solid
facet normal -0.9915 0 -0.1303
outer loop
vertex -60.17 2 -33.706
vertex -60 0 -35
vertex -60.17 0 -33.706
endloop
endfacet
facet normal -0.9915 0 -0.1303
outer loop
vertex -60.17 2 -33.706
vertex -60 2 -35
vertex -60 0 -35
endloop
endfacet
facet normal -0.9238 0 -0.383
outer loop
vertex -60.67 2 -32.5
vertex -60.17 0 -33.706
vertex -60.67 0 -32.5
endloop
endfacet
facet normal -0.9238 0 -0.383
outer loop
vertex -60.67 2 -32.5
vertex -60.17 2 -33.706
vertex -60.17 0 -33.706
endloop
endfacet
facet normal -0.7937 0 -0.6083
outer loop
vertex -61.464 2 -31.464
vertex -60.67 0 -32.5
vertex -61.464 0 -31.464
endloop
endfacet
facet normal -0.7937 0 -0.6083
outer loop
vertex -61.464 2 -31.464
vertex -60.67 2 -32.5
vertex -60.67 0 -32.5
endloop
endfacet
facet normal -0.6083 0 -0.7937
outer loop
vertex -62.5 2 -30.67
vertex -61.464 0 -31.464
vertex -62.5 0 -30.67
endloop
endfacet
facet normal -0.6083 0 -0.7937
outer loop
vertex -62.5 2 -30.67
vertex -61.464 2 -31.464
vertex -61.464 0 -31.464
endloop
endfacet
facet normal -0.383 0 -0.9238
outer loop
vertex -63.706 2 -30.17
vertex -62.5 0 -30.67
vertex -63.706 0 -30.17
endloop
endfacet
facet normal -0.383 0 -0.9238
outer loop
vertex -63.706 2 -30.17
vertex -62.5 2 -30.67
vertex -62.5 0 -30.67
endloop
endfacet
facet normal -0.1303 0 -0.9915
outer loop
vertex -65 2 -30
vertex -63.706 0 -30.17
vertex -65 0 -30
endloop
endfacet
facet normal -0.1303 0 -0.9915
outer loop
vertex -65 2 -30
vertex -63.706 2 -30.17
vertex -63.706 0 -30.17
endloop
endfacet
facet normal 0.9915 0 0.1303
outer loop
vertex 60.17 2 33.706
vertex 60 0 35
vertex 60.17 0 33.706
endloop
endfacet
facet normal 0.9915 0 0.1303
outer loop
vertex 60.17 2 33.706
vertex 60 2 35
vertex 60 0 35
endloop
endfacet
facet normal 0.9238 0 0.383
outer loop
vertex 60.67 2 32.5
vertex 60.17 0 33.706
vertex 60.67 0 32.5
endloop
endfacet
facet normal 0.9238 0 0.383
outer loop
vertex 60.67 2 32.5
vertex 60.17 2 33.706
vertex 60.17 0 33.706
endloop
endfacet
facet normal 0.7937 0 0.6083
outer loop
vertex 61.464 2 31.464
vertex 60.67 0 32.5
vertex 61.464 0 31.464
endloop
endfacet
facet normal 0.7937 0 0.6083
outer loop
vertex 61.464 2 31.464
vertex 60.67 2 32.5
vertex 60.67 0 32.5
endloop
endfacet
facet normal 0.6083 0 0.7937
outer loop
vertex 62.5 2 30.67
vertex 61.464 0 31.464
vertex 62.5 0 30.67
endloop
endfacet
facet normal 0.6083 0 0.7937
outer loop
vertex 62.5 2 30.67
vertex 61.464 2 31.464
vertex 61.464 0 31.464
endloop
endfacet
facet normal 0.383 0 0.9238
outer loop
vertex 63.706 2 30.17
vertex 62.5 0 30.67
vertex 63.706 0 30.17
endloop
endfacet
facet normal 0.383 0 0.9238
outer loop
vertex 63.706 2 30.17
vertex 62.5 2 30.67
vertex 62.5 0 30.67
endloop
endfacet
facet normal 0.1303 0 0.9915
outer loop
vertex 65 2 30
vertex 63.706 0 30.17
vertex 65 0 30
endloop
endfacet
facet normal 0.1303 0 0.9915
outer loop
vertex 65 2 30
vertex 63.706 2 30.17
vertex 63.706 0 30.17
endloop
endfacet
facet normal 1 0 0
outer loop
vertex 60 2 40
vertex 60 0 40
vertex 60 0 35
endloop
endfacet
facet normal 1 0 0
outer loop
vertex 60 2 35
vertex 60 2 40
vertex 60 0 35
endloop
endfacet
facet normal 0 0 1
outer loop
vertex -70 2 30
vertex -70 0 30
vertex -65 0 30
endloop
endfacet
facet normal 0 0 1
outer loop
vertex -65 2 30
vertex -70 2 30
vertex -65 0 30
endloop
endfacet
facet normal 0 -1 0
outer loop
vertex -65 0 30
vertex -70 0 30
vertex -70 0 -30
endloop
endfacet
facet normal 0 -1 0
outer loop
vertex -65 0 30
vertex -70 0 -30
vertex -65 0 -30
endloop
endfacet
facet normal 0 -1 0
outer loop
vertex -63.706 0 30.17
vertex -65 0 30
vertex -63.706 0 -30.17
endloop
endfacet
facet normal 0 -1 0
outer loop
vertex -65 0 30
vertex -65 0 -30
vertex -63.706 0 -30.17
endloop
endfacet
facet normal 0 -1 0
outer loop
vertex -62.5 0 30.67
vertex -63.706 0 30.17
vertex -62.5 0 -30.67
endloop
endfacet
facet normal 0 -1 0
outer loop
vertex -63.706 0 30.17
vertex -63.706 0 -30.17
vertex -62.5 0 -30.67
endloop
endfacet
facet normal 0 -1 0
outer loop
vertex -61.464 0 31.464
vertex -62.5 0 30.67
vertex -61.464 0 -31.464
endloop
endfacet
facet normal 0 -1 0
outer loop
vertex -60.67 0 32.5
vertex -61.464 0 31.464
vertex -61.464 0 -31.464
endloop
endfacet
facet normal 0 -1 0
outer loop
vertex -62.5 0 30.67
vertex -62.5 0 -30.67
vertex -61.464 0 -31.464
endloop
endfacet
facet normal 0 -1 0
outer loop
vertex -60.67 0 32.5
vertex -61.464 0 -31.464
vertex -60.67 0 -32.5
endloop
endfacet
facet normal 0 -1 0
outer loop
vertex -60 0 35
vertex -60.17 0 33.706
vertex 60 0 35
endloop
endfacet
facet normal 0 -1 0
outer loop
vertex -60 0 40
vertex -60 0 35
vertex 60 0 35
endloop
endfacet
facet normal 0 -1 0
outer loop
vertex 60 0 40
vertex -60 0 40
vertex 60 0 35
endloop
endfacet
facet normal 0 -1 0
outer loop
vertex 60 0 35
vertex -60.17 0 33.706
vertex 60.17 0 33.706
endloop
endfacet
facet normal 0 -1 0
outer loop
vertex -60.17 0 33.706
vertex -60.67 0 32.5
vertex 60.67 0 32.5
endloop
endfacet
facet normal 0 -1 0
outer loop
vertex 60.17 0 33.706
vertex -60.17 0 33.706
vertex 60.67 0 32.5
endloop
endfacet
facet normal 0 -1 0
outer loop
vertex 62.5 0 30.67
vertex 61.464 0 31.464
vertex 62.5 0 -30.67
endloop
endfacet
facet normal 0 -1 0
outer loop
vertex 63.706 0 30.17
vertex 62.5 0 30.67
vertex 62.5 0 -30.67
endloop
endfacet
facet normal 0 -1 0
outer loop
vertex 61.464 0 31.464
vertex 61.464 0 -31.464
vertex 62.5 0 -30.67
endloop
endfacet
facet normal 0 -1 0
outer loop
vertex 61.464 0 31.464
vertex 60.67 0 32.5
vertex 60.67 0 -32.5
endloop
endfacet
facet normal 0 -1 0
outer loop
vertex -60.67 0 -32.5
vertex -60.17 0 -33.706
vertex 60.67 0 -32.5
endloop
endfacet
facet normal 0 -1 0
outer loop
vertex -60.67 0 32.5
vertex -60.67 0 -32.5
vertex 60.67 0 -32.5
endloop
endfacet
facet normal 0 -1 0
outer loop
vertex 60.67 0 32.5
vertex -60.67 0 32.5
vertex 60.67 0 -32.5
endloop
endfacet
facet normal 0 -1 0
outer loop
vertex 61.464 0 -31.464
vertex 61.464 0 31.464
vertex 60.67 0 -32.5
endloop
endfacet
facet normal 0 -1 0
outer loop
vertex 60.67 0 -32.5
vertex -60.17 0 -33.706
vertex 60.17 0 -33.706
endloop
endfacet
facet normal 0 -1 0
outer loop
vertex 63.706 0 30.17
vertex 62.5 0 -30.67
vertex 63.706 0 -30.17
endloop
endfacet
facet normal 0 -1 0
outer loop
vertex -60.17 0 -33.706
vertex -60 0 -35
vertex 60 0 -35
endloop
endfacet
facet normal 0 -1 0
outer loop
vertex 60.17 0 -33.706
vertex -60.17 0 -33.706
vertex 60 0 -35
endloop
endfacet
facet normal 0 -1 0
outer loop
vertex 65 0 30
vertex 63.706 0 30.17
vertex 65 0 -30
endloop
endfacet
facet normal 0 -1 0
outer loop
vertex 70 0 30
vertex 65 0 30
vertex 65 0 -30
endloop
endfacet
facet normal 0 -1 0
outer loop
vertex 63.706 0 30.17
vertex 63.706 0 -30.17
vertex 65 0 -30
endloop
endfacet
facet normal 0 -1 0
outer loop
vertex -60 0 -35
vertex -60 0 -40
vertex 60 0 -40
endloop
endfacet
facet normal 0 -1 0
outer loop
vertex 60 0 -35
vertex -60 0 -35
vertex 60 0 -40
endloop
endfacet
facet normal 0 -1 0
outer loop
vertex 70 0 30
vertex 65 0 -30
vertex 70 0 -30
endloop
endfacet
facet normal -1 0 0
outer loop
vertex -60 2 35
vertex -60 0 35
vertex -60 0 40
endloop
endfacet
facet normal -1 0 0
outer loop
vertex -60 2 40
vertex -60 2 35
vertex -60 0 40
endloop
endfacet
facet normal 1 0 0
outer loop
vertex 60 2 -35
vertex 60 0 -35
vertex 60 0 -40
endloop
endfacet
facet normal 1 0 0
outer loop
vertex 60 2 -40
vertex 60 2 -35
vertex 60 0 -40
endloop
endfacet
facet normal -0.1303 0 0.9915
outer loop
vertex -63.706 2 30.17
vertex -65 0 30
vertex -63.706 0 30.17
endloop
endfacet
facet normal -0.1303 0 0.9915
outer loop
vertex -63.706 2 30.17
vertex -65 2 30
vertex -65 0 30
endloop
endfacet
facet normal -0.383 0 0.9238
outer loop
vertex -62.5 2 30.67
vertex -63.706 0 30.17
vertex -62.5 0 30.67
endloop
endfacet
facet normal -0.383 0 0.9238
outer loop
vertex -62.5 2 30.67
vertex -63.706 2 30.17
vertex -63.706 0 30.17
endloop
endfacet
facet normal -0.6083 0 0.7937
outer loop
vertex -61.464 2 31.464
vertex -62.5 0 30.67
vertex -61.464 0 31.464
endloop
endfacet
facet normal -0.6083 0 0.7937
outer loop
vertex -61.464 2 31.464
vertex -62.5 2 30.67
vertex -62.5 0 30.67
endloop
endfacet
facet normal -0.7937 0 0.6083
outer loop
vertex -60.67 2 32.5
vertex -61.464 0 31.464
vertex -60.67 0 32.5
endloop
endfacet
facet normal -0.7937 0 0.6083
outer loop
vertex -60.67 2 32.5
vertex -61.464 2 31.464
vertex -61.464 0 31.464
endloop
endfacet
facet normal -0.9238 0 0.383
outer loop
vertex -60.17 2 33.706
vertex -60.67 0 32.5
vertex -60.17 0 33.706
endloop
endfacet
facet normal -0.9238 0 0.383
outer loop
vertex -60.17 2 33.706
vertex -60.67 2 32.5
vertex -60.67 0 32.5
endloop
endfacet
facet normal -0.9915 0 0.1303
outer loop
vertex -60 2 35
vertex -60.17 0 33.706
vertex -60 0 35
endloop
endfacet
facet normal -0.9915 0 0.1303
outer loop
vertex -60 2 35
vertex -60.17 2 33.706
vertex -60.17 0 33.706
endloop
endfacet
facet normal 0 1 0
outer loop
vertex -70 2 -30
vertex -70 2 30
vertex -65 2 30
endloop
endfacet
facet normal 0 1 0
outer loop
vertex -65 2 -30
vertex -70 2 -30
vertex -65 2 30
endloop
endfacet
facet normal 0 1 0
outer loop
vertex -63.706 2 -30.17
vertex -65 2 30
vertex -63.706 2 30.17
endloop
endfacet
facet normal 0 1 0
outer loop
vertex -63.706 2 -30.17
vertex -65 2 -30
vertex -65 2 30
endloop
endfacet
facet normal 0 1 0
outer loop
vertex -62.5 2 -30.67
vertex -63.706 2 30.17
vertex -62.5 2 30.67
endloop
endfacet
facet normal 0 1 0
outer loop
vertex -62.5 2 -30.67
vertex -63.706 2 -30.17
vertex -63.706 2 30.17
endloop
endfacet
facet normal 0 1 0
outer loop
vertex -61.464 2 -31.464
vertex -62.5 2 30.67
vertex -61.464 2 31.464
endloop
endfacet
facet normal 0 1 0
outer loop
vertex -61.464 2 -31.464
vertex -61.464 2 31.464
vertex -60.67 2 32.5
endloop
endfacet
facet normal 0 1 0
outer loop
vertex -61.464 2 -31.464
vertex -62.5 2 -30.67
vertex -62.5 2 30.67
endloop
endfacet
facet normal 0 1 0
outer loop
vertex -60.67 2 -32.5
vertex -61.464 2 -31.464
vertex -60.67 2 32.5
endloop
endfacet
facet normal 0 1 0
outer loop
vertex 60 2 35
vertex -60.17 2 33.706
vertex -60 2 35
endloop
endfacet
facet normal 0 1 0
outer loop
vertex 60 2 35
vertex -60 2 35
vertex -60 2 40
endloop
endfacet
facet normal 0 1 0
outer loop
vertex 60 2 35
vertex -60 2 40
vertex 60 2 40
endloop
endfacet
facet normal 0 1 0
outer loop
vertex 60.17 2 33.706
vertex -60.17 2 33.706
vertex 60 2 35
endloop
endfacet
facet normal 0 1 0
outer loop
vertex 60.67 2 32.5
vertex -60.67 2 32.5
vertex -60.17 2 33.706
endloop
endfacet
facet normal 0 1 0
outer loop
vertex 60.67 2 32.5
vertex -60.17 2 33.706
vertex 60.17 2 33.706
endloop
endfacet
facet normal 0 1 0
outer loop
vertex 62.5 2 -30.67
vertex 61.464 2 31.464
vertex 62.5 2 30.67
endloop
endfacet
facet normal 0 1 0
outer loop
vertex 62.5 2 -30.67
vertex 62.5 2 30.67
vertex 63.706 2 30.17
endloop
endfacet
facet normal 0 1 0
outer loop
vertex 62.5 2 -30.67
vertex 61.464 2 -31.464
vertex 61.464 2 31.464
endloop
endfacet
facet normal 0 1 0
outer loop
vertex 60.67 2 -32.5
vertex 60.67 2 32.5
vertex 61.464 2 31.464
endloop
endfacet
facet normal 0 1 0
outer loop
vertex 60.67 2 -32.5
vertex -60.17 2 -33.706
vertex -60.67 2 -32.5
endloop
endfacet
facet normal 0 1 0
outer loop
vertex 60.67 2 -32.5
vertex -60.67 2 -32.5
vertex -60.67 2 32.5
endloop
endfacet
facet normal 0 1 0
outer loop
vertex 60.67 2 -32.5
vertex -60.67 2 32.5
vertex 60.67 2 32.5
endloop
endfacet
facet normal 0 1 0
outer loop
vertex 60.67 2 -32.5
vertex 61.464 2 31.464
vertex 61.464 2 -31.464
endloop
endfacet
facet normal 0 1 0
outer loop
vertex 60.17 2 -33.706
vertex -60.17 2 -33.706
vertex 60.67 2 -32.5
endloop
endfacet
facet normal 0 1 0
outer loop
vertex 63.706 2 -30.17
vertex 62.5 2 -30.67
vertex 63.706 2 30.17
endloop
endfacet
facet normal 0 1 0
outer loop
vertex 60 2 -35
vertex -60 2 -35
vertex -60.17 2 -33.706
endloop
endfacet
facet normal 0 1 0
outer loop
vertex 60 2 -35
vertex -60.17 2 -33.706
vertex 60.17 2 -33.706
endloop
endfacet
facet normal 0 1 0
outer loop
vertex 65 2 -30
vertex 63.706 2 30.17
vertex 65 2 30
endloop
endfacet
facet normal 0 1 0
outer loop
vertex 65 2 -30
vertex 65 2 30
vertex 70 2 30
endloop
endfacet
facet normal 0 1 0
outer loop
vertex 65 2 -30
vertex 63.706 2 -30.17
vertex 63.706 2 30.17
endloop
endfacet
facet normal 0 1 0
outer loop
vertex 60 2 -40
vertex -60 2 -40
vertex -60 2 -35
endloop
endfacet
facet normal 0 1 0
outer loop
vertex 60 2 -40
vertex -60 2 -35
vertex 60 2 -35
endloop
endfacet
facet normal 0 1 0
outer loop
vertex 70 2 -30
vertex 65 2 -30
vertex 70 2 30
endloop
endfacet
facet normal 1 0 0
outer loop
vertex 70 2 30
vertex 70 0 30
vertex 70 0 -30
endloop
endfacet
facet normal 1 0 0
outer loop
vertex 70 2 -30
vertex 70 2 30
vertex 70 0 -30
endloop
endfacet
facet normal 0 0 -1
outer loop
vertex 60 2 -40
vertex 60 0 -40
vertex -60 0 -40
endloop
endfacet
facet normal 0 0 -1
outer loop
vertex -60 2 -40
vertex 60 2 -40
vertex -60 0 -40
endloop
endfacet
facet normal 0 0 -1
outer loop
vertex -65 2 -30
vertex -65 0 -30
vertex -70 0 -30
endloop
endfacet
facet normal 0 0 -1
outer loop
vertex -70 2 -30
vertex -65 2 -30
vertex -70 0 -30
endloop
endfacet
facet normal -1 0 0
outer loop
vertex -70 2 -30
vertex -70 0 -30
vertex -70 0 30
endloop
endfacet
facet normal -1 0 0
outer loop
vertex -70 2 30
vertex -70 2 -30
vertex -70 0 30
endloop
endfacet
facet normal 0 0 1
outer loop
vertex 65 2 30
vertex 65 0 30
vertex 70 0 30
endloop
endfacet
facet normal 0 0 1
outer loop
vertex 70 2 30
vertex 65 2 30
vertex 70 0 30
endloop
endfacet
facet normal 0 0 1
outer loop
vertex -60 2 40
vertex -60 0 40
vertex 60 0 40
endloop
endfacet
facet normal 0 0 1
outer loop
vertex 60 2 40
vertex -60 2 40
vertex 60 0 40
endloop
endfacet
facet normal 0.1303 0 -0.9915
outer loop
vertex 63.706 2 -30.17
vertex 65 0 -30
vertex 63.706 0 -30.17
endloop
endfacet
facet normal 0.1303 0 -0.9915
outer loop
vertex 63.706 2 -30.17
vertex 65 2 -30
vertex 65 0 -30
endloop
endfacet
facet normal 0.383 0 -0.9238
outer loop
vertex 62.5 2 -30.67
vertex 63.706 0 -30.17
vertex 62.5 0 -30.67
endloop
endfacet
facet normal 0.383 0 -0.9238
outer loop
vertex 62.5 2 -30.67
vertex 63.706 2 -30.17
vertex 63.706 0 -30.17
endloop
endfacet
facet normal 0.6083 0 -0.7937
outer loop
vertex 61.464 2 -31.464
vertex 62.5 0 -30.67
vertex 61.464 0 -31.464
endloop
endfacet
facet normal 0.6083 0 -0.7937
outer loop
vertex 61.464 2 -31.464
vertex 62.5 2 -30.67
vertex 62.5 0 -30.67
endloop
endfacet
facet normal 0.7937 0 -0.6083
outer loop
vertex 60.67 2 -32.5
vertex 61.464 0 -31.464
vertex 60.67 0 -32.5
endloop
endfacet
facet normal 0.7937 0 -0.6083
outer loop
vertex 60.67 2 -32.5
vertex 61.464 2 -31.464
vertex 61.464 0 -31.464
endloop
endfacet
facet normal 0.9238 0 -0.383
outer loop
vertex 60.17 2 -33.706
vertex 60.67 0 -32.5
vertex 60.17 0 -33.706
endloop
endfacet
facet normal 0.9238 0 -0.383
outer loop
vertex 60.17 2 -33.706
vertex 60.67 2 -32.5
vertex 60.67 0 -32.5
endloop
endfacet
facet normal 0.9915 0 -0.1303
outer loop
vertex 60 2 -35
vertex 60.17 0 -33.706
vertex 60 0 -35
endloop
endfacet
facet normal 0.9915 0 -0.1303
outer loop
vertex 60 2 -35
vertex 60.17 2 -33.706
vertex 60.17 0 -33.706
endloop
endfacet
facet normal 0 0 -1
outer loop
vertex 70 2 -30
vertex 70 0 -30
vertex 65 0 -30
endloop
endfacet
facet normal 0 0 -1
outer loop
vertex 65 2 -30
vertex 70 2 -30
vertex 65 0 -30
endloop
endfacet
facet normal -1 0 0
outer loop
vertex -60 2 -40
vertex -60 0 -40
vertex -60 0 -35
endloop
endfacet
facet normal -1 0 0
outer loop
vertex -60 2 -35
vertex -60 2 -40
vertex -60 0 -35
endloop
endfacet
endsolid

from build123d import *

# Parameters (mm, degrees)
SKETCH1_W           = 2
SKETCH1_H           = 56
SKETCH1_W_2         = 116
SKETCH1_H_2         = 2
BOSS_EXTRUDE8_DEPTH = 2
FILLET1_R           = 5


with BuildPart() as part:
    # Sketch1 → Boss-Extrude8 (new body)
    with BuildSketch(Plane(origin=(0, 0, 0), x_dir=(1, 0, 0), z_dir=(0, 1, 0))):
        with Locations((-69, 0)):
            Rectangle(SKETCH1_W, SKETCH1_H)
        Polygon((-58, 38), (-58, 40), (-60, 40), (-60, 30), (-70, 30), (-70, 28), (-68, 28), (-58, 28), align=None)
        with Locations((0, 39)):
            Rectangle(SKETCH1_W_2, SKETCH1_H_2)
        Polygon((68, -28), (68, 28), (58, 28), (58, 38), (-58, 38), (-58, 28), (-68, 28), (-68, -28), (-58, -28), (-58, -38), (58, -38), (58, -28), align=None)
        Polygon((70, 28), (70, 30), (60, 30), (60, 40), (58, 40), (58, 38), (58, 28), (68, 28), align=None)
        with Locations((69, 0)):
            Rectangle(SKETCH1_W, SKETCH1_H)
        Polygon((70, -30), (70, -28), (68, -28), (58, -28), (58, -38), (58, -40), (60, -40), (60, -30), align=None)
        with Locations((0, -39)):
            Rectangle(SKETCH1_W_2, SKETCH1_H_2)
        Polygon((-58, -40), (-58, -38), (-58, -28), (-68, -28), (-70, -28), (-70, -30), (-60, -30), (-60, -40), align=None)
    extrude(amount=BOSS_EXTRUDE8_DEPTH)

    # Fillet1
    fillet1_edges = [part.edges().sort_by_distance(p)[0] for p in [
        (60, 1, 30),
        (-60, 1, 30),
        (-60, 1, -30),
        (60, 1, -30),
    ]]
    fillet(fillet1_edges, radius=FILLET1_R)


solid = part.part
